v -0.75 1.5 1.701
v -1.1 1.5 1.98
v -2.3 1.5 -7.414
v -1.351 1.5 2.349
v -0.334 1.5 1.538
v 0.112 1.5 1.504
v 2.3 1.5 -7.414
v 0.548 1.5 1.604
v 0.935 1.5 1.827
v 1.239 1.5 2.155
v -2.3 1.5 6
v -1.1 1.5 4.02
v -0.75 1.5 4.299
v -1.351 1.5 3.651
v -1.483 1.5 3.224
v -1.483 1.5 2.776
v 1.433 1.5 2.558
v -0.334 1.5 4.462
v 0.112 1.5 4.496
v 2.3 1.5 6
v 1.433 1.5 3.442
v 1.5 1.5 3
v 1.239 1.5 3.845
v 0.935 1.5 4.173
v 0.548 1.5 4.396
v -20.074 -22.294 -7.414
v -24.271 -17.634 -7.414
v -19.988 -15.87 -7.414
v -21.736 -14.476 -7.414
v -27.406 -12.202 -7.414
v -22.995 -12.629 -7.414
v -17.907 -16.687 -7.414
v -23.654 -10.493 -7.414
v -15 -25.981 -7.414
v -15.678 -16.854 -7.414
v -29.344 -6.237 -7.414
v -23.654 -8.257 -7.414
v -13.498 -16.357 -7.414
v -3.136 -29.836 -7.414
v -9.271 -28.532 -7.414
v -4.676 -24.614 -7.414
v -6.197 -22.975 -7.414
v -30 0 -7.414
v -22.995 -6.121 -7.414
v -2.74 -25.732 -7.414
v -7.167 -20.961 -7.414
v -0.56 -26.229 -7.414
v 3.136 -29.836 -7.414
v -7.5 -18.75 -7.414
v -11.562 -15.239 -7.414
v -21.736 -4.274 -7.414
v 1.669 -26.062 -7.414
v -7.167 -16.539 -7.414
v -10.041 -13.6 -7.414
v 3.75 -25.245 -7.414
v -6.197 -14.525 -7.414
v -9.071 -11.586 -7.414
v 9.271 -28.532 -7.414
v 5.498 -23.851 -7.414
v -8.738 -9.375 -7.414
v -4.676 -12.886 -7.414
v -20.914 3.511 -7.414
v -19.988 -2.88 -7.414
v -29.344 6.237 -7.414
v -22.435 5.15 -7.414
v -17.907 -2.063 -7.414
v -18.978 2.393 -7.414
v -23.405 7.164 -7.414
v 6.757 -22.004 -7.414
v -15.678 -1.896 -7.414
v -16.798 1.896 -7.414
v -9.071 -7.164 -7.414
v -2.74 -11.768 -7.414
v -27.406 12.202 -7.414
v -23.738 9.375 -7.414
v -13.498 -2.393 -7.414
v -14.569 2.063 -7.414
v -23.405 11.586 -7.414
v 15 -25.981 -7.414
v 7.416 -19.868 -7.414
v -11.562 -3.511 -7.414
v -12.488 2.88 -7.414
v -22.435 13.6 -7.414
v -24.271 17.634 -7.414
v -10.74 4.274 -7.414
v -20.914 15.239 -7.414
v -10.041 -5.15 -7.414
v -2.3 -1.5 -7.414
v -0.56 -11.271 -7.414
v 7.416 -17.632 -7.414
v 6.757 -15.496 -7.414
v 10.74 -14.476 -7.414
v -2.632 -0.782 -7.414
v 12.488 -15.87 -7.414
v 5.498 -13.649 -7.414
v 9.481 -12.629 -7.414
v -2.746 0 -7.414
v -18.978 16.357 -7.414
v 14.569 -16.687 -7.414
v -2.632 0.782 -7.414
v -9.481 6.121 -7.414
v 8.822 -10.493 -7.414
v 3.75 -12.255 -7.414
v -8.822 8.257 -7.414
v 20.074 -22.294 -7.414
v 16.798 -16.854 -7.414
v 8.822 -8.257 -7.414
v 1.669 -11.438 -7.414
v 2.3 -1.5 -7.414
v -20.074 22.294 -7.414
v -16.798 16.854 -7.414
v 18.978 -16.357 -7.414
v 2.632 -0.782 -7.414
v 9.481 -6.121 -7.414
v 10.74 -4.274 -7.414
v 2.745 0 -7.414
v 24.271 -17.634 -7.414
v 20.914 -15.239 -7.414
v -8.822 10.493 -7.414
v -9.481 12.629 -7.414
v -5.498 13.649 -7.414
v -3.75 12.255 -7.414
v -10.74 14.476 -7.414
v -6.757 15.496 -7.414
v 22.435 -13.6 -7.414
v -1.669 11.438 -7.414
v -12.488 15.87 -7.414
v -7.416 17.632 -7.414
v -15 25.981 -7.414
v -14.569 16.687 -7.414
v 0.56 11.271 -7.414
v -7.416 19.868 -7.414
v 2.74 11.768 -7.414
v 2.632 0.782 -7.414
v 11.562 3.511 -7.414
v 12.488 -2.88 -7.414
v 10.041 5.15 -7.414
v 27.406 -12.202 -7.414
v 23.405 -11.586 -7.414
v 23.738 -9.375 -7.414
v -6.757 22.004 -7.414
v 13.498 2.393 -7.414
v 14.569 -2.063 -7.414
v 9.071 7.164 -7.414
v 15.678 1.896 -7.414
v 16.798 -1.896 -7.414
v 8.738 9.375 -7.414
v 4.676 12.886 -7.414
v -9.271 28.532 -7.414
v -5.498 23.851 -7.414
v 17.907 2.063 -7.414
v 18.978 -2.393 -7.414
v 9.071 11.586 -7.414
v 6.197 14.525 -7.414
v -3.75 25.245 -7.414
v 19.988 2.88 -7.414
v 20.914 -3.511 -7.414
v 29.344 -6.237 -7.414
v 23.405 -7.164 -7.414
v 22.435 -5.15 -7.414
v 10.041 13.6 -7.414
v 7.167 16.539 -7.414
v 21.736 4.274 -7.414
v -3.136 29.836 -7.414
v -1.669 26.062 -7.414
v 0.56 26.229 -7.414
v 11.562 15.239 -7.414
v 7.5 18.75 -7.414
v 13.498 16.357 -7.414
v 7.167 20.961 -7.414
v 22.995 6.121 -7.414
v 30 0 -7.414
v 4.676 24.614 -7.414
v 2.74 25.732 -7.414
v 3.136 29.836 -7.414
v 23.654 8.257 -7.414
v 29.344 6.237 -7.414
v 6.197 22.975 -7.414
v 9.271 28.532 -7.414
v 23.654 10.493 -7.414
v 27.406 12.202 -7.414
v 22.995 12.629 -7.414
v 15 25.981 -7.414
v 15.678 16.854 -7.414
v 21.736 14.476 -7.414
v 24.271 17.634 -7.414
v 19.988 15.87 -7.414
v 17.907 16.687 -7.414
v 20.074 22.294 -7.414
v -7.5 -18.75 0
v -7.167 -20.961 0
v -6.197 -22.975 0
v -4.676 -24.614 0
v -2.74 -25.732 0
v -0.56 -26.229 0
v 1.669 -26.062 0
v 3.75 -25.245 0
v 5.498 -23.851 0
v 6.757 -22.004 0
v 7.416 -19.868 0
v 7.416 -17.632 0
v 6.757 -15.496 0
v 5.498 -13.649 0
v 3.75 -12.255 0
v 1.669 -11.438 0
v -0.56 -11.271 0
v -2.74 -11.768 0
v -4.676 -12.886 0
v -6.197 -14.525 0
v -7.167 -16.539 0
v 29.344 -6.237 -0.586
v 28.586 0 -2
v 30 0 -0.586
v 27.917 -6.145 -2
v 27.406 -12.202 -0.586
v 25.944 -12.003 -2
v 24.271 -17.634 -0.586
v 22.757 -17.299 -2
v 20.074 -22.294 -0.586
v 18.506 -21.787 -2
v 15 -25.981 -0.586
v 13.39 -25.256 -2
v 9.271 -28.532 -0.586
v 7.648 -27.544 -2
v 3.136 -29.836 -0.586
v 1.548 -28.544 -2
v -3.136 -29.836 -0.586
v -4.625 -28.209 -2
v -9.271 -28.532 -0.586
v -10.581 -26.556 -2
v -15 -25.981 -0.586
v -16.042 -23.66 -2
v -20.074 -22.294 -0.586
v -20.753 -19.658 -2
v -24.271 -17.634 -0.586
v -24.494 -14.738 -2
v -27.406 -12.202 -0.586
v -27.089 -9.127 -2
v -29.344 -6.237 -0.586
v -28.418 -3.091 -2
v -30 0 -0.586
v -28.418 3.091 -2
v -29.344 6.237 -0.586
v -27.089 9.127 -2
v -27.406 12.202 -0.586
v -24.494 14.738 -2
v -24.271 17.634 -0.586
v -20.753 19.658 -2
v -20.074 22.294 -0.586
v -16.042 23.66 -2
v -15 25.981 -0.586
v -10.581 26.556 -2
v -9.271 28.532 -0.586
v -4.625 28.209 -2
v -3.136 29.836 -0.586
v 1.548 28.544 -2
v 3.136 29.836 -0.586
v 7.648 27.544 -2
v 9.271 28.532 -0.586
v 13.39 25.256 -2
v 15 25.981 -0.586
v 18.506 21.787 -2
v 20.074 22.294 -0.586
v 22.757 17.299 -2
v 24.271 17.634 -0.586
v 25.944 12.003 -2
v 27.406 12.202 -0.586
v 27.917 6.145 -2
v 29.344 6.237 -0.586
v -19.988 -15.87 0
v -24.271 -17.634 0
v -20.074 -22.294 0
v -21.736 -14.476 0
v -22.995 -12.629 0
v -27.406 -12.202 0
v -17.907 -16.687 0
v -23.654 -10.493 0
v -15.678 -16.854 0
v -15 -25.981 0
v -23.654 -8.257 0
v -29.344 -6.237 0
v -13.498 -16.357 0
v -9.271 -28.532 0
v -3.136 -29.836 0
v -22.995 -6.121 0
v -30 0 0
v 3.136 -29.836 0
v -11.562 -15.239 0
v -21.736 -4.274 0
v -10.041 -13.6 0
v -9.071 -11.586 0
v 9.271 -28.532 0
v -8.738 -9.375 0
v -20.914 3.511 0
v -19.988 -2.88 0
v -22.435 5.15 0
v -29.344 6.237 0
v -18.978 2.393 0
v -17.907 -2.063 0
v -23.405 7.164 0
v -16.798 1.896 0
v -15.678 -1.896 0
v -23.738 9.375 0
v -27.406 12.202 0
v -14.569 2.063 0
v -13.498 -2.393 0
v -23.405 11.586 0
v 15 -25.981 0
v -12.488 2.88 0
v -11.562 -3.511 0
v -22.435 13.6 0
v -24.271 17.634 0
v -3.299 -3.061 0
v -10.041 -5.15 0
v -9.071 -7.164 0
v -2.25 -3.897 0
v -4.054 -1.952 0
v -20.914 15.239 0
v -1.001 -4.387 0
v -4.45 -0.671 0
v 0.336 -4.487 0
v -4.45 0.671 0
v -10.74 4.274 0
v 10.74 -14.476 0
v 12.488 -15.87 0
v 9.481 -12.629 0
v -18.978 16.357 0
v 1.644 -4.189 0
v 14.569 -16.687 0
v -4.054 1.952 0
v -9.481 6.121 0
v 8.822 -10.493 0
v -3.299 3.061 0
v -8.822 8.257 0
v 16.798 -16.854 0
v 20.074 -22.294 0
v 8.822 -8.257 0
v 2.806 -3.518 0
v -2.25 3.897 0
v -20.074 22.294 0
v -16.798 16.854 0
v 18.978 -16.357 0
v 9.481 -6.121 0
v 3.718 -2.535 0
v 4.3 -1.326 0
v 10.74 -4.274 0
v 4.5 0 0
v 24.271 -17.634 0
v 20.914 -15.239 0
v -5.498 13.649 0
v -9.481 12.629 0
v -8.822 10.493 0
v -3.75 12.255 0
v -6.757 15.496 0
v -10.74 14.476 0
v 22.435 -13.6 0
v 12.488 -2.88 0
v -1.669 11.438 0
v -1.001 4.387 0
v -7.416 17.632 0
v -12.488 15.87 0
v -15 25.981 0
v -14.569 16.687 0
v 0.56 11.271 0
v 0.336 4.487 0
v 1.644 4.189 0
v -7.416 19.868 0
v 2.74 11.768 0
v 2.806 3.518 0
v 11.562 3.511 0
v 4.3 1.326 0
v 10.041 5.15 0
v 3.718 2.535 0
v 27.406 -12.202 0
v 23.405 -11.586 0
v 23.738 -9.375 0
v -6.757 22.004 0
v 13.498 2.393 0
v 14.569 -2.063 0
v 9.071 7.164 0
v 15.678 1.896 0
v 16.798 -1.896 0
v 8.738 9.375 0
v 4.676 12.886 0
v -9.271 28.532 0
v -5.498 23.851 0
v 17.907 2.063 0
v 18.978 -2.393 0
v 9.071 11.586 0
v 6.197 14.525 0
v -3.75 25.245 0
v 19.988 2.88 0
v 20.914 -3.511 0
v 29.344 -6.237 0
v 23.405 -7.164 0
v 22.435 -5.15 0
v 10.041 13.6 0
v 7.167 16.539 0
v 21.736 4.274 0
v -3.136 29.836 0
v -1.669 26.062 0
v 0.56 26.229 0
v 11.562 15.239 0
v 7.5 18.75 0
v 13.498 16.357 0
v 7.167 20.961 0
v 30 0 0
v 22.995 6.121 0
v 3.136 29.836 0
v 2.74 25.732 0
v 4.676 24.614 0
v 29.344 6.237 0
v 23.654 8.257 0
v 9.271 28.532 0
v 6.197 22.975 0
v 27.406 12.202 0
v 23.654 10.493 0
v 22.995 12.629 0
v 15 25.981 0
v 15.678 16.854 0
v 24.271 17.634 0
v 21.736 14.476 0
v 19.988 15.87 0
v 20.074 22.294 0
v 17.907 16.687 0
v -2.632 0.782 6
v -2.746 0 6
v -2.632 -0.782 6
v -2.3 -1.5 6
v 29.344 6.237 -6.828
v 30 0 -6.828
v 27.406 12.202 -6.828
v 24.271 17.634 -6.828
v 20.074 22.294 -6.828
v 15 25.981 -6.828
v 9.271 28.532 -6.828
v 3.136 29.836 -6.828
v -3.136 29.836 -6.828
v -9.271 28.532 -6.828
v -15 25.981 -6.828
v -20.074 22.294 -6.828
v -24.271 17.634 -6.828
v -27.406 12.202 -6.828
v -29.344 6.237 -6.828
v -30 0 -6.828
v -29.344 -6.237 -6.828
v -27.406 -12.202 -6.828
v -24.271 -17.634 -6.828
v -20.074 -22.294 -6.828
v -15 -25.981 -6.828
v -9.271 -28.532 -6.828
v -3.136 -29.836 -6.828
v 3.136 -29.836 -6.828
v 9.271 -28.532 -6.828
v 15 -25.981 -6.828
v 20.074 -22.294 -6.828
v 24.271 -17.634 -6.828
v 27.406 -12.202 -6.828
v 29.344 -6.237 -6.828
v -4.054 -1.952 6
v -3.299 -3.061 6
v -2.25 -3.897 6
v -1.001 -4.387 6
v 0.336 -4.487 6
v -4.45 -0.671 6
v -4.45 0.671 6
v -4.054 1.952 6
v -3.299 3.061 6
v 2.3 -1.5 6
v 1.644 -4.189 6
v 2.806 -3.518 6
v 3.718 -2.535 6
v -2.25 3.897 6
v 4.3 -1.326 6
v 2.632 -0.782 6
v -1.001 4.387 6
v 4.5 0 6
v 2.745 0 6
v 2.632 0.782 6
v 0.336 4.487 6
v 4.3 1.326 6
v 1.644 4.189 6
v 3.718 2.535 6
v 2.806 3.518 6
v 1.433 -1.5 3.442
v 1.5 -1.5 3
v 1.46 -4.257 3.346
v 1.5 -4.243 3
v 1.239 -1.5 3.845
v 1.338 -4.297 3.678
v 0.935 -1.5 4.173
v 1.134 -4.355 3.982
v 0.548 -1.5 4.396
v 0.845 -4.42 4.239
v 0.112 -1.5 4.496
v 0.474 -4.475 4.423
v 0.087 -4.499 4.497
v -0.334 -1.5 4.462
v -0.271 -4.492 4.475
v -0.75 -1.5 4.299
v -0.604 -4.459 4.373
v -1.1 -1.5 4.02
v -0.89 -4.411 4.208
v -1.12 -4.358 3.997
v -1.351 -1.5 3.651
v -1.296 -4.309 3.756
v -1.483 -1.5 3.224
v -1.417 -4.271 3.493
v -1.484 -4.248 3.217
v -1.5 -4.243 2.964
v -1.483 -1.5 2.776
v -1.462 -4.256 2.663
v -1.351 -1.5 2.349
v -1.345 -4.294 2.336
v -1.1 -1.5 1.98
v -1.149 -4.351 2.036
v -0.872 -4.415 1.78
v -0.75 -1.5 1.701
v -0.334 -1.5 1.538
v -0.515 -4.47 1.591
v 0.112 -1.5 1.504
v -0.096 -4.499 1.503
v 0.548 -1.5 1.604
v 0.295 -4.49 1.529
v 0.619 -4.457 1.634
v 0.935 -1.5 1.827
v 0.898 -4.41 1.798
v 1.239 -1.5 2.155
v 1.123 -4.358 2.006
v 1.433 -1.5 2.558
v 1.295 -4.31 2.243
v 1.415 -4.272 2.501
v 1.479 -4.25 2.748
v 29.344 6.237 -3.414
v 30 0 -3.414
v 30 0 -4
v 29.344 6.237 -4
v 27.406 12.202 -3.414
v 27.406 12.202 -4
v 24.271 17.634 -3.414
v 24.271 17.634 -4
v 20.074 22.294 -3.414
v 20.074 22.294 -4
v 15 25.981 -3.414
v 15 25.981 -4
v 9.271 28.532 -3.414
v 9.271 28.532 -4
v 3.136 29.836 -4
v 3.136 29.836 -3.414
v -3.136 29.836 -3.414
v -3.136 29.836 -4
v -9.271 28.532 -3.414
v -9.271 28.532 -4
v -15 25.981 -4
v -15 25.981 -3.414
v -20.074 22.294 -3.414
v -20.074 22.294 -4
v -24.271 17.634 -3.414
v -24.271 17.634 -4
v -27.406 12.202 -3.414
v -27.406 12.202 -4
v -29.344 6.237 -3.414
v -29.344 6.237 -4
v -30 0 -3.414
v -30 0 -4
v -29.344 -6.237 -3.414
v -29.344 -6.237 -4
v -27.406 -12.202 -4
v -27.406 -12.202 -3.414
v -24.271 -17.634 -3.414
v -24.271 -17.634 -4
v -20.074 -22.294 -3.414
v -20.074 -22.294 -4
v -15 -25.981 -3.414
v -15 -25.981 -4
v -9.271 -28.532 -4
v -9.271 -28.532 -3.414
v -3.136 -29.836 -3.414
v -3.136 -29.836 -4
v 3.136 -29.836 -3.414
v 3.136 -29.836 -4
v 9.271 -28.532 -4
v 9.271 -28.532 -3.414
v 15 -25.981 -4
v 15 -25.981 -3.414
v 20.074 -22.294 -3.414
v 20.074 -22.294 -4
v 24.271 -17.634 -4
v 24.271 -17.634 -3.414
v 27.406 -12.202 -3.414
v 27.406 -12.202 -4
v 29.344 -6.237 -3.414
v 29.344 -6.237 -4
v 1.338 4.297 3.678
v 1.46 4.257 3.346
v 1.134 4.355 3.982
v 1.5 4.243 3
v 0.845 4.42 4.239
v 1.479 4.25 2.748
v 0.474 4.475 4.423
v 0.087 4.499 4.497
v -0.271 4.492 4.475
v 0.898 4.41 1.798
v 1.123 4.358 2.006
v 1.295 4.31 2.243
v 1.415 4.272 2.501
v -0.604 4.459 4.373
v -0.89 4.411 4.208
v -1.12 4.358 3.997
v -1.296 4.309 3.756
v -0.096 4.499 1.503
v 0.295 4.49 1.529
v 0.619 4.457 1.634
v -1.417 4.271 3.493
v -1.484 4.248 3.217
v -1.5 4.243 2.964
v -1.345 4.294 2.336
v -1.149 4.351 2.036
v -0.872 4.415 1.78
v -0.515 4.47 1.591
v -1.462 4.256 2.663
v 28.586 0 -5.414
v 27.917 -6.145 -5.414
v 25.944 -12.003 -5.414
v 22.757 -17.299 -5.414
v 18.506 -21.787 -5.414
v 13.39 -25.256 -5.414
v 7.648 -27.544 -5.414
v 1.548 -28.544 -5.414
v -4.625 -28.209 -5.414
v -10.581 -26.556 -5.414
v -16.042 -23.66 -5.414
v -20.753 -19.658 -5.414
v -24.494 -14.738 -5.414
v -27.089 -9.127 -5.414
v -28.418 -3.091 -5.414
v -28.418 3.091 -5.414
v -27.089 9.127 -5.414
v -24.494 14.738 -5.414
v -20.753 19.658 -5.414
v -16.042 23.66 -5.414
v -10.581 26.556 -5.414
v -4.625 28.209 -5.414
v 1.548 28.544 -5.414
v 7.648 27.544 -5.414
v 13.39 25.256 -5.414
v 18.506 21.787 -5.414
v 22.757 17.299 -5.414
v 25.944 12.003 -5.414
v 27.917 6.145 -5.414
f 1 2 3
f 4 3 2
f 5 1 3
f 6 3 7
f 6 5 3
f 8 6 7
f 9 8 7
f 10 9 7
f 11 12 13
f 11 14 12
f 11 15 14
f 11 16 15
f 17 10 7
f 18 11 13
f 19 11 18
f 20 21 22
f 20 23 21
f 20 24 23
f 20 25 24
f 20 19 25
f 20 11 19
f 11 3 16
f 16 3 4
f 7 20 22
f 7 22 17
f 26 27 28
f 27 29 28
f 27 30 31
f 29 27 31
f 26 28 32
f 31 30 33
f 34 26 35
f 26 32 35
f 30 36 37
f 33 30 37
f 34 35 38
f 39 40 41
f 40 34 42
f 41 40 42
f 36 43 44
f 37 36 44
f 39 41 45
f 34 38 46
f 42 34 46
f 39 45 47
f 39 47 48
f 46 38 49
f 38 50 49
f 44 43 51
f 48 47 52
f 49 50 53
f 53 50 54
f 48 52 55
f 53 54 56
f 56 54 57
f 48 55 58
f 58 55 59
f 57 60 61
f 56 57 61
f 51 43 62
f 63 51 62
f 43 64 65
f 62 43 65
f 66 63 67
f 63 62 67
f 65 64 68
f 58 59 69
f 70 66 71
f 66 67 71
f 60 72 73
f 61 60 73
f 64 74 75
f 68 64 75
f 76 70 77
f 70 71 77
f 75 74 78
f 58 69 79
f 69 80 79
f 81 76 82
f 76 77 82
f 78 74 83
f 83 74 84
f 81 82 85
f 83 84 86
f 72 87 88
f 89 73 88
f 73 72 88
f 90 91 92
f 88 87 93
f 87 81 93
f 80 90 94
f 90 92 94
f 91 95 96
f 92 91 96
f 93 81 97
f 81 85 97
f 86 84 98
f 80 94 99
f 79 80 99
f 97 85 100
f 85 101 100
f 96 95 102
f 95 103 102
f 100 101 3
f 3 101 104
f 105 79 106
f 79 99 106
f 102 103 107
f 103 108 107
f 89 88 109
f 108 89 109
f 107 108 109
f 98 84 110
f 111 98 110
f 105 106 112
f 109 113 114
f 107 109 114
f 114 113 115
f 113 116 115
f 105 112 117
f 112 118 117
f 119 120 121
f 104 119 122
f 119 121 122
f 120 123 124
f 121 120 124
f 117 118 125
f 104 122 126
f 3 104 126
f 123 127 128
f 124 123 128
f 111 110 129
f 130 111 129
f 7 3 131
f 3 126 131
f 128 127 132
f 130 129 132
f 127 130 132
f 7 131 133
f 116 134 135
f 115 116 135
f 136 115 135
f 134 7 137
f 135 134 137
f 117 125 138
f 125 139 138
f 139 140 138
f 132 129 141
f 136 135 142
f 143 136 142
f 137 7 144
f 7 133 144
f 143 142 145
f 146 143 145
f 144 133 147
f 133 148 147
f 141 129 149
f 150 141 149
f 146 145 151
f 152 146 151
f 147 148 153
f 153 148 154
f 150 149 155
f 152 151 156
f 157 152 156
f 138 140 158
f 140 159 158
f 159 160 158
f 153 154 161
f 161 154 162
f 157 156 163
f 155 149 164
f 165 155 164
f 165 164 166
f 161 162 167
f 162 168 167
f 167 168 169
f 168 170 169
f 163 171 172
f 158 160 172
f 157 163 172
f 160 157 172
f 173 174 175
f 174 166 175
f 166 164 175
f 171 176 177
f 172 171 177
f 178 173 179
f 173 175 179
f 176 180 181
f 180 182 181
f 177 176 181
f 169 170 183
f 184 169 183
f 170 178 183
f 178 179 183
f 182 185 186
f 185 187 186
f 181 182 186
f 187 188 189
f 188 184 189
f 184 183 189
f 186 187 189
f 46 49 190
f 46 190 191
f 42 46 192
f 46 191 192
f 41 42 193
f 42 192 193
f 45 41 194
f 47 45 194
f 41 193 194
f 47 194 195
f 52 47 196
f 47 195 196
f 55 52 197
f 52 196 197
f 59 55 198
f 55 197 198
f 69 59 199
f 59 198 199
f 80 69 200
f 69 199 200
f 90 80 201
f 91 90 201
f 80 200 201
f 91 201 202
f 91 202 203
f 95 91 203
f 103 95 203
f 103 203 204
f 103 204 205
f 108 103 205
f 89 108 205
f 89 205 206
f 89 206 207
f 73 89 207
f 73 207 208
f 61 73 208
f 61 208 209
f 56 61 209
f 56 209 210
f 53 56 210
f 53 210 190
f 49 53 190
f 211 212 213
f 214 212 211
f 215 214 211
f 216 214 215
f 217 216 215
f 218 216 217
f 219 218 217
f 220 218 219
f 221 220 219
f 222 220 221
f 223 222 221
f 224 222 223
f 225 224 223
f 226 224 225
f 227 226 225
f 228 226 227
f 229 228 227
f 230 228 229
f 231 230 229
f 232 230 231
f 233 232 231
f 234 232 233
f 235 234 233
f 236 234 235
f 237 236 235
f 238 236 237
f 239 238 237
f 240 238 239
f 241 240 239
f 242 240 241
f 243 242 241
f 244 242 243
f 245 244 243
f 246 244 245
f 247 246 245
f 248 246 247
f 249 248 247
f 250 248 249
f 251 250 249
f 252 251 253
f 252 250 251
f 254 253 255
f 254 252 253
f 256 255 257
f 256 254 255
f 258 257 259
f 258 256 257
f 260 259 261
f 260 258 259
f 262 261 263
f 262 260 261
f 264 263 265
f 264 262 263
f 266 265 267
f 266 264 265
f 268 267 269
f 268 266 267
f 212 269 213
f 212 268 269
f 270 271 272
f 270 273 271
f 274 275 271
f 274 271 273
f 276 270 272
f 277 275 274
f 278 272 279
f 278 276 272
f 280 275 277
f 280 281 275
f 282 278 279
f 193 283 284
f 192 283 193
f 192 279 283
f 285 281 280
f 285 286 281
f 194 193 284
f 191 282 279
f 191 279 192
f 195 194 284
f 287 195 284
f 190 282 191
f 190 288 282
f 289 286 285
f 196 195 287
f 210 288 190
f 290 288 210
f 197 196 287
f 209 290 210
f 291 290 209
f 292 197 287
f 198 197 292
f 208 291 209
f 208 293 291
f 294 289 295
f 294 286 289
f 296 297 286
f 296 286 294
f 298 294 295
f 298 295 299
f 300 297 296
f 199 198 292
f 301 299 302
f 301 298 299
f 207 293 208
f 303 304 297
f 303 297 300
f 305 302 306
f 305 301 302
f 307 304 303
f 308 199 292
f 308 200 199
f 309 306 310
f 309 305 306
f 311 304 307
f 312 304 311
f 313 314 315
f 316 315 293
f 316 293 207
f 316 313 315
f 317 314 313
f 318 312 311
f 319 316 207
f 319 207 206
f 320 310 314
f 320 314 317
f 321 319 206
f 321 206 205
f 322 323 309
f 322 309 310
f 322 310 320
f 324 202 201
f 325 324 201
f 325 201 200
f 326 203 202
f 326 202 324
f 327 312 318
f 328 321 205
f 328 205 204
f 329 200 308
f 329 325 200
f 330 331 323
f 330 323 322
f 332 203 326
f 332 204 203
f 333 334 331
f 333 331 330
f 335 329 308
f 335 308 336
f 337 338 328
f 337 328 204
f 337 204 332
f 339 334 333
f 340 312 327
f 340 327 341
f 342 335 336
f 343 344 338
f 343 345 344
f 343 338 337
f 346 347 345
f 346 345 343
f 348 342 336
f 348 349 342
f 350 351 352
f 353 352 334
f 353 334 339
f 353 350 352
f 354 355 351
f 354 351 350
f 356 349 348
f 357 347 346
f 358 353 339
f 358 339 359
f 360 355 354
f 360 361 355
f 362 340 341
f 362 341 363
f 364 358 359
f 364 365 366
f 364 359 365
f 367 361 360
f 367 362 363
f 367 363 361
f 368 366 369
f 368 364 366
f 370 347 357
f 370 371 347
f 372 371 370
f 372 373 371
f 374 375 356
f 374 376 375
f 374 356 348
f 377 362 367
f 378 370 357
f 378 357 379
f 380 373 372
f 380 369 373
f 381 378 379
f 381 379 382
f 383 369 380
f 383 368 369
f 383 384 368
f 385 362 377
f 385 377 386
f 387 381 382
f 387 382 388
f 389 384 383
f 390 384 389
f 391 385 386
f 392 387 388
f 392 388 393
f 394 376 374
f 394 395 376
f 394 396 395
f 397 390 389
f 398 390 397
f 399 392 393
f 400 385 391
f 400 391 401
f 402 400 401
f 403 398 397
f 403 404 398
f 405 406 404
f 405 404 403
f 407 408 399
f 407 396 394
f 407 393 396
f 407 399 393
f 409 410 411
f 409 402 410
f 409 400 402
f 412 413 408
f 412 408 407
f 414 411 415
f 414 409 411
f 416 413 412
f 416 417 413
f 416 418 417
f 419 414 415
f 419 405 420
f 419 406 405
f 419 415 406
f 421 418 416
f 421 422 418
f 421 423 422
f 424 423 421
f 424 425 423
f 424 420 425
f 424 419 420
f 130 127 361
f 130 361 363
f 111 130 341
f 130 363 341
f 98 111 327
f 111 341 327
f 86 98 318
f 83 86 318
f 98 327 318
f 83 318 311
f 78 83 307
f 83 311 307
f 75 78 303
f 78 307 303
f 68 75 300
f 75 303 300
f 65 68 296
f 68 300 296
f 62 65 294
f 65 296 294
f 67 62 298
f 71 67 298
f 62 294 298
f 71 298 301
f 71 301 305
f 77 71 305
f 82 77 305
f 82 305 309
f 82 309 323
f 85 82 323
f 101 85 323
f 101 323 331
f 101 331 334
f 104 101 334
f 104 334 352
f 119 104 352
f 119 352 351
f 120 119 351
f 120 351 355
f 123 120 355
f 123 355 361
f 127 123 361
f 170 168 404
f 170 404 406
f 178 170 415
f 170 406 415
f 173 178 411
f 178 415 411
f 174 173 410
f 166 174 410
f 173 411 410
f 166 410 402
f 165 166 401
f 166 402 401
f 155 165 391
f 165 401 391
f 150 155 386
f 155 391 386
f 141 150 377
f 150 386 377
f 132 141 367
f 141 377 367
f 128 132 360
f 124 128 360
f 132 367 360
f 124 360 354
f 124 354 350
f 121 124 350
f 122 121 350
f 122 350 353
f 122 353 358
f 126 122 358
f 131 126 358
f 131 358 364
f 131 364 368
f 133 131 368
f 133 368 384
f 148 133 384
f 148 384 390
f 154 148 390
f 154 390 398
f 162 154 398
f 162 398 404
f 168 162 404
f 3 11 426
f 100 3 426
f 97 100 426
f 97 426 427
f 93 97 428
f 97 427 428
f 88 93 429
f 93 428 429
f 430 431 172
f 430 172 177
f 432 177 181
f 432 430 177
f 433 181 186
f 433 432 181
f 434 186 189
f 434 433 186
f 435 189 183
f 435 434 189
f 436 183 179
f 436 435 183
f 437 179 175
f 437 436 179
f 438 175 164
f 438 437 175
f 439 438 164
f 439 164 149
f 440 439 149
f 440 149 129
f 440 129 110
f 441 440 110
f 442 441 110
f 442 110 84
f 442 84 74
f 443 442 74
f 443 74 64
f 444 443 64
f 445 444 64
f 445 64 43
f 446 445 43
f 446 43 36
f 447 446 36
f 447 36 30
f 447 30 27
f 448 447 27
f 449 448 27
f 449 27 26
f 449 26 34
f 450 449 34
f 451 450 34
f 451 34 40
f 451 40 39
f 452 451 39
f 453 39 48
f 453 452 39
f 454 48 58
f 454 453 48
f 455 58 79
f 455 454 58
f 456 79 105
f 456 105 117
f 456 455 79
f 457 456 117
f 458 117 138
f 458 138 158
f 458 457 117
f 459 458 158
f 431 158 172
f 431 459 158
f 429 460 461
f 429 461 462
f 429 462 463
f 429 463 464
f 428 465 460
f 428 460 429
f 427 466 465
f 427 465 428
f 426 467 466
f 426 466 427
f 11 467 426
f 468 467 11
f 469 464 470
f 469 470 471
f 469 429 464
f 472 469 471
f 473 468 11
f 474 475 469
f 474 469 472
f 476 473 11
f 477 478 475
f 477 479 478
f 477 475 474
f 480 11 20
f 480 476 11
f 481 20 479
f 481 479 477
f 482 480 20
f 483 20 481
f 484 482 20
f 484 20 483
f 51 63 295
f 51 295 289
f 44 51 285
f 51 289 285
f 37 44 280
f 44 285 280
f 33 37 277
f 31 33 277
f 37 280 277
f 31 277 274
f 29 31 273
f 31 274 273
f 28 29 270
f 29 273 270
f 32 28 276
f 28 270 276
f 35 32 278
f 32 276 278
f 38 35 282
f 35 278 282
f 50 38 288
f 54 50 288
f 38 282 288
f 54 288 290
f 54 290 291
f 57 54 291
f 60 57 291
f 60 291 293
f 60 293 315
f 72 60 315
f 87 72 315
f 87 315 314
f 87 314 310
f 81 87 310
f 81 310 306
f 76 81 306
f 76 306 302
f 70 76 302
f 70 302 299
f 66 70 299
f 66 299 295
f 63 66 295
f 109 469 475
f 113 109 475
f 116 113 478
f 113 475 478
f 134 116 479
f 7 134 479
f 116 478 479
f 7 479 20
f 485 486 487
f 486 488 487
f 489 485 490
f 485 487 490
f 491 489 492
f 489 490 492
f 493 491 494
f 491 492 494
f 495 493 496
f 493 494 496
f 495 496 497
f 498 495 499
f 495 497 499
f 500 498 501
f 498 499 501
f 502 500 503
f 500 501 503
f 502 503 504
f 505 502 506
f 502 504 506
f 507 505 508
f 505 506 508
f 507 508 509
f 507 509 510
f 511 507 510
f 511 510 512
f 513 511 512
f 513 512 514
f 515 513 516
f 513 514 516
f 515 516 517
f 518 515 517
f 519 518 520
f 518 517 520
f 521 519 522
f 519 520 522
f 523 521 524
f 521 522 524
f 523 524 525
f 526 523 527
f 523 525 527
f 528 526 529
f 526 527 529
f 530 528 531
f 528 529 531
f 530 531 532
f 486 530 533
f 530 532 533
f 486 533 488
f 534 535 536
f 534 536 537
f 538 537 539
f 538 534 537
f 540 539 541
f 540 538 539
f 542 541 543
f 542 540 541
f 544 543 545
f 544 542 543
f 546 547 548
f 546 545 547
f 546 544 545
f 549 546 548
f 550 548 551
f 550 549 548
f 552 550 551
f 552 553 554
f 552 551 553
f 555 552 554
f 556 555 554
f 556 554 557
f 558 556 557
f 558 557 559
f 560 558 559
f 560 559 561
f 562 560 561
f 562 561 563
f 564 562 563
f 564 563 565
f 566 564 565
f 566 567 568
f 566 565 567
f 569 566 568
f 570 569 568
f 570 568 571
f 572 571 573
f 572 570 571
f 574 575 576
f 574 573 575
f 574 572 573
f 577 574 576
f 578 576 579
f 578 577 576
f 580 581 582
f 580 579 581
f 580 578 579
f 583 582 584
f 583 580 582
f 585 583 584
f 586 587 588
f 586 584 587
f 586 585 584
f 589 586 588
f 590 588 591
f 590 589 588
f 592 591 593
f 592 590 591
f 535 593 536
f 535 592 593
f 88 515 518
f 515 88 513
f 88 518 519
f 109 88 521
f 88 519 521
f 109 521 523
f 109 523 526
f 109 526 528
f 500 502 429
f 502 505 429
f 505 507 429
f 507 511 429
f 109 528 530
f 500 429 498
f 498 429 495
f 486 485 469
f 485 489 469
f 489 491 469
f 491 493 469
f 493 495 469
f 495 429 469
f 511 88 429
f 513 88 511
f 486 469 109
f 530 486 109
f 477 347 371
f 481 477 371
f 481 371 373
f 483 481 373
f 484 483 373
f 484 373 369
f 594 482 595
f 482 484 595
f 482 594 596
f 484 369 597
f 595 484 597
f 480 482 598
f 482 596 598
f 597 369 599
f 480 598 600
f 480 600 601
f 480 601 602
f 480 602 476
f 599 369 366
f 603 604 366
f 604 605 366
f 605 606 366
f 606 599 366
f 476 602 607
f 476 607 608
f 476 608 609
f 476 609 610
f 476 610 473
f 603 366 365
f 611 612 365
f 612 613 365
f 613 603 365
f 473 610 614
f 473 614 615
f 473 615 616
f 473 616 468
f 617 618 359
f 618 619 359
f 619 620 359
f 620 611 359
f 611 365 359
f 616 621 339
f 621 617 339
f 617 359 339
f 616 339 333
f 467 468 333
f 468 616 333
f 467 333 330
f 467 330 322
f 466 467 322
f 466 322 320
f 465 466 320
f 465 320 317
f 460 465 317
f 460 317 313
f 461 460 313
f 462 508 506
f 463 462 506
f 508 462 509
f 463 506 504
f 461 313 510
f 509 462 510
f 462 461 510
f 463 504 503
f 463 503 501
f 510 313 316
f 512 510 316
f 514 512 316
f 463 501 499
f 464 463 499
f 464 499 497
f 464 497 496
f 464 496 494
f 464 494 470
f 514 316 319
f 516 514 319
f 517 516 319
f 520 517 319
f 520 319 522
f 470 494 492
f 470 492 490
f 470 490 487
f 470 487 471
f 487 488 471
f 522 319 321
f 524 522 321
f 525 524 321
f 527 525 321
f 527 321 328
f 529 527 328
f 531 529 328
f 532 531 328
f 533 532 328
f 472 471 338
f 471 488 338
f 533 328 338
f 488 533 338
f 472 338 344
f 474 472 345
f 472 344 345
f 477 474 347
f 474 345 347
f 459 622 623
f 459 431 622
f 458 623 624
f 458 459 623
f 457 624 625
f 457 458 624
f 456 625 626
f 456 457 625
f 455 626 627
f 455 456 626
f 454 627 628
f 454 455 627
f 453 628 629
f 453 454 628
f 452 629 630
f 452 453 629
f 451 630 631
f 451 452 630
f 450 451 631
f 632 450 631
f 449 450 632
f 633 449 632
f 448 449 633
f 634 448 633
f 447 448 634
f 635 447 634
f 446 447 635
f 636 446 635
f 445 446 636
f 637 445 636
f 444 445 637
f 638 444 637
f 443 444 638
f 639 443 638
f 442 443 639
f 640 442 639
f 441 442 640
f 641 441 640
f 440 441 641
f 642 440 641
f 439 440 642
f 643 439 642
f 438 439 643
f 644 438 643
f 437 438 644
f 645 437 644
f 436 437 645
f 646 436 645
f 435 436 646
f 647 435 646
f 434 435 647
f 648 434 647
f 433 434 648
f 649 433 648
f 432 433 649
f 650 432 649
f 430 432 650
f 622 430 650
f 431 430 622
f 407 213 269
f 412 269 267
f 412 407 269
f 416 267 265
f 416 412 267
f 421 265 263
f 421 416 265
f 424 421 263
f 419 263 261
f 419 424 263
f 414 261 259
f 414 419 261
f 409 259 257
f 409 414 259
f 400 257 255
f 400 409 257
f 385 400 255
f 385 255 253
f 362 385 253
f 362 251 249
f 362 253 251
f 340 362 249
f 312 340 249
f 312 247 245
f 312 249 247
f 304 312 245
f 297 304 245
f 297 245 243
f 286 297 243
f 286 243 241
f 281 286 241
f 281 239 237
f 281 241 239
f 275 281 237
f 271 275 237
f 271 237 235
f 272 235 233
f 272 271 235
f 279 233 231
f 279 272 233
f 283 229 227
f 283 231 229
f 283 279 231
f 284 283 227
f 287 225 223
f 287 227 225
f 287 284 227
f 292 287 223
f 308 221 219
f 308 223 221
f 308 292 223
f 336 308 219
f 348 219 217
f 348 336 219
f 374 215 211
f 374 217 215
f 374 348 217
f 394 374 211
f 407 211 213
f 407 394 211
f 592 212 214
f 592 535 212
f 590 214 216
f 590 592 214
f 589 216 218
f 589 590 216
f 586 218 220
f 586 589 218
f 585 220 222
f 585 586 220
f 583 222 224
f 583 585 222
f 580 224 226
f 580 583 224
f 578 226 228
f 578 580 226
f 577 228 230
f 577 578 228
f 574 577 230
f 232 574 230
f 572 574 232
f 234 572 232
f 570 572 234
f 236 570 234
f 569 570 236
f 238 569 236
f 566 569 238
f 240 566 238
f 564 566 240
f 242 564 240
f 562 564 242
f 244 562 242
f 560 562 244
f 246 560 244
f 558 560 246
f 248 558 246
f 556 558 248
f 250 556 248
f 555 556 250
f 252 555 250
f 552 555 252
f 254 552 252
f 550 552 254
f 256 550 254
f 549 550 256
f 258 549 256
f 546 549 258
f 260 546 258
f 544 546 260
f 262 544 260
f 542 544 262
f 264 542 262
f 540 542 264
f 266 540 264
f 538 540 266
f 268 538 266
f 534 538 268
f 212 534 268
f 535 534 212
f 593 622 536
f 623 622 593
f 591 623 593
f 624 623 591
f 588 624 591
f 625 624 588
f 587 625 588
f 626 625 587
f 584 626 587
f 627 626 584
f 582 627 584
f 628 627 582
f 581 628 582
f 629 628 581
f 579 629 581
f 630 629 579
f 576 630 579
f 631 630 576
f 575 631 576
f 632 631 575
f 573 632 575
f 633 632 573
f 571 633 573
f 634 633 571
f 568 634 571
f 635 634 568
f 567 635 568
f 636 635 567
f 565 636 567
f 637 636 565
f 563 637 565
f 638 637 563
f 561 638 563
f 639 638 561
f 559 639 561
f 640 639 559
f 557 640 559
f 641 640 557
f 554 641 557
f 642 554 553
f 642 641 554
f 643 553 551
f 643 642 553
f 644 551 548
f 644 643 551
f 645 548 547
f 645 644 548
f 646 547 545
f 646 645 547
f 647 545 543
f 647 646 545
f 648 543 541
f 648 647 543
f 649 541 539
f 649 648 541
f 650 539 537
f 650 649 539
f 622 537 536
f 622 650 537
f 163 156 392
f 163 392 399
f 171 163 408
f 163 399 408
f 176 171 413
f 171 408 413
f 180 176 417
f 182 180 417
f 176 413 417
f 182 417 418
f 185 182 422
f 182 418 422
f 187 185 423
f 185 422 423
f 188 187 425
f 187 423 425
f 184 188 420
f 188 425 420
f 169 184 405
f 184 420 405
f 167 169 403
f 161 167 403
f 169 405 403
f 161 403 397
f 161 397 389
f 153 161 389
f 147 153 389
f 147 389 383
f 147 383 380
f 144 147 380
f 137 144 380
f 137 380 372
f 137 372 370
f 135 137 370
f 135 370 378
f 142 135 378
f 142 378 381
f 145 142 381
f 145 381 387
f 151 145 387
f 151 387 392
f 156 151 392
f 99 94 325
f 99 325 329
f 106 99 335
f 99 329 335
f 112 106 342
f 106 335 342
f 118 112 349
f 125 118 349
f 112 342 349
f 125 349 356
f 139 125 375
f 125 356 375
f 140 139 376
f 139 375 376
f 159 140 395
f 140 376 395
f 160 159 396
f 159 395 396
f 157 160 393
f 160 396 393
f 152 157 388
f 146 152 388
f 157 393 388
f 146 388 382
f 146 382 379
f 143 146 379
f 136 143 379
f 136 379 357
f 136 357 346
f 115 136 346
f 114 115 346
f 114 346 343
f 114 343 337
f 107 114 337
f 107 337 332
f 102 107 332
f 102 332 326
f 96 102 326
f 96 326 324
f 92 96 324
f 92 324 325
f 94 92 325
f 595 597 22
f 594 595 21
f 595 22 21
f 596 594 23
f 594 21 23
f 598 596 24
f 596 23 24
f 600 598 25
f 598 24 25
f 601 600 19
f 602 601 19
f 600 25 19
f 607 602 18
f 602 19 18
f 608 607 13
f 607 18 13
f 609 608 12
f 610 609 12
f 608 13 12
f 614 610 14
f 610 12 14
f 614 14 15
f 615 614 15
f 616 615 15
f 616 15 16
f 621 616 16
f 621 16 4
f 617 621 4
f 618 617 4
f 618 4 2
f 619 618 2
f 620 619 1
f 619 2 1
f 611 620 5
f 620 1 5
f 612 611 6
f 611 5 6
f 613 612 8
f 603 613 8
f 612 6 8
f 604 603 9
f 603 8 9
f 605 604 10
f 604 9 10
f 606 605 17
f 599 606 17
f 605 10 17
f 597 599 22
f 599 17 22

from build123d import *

# Parameters (mm, degrees)
F0_R             = 30
F0_R_2           = 4.5
F1_DEPTH         = 7.414
F2_DEPTH         = 6
F3_R             = 1.5
F4_DEPTH         = 12.5
F5_W             = 4.6
F5_H             = 3
F6_DEPTH         = 13.414
F9_R             = 7.5
F10_DEPTH        = 25
F10_COPIES_COUNT = 6


# Not quite as in the source:
# - a pattern or mirror of a feature is missing from the dataset's text; its kind, count and spacing are read off the source's solid


with BuildPart() as f1:
    # F0 (on Top) → F1 (new body)
    with BuildSketch(Plane.XY):
        Circle(F0_R)
        Circle(F0_R_2, mode=Mode.SUBTRACT)
        Circle(F0_R_2)
    extrude(amount=-F1_DEPTH)

    # F0 (on Top) → F2 (join)
    with BuildSketch(Plane.XY):
        Circle(F0_R_2)
    extrude(amount=F2_DEPTH)

    # F3 (on Front) → F4 (cut, symmetric)
    with BuildSketch(Plane.XZ):
        with Locations((0, 3)):
            Circle(F3_R)
    extrude(amount=F4_DEPTH, both=True, mode=Mode.SUBTRACT)

    # F5 (on face) → F6 (cut, through all)
    with BuildSketch(Plane.XY.offset(6)):
        Rectangle(F5_W, F5_H)
        with BuildLine():
            ThreePointArc((-2.3, 1.5), (-2.7459060435, 0), (-2.3, -1.5))
            Line((-2.3, -1.5), (-2.3, 1.5))
        make_face()
        with BuildLine():
            Line((2.3, 1.5), (2.3, -1.5))
            ThreePointArc((2.3, -1.5), (2.745183651, 0), (2.3, 1.5))
        make_face()
    extrude(amount=-F6_DEPTH, mode=Mode.SUBTRACT)

    # F7 (on Front) → F8 (revolve, cut)
    with BuildSketch(Plane.XZ):
        Polygon((30, -3.4142135624), (30, -0.5857864376), (28.5857864376, -2), align=None)
        Polygon((30, -6.8282135624), (30, -3.9997864376), (28.5857864376, -5.414), align=None)
    revolve(axis=Axis((0, 0, 0.7614716887), (0, 0, -1)), mode=Mode.SUBTRACT)

    # F9 (on face) → F10 (cut)
    with BuildSketch(Plane.XY):
        with Locations((0, 18.75)):
            Circle(F9_R)
    f10 = extrude(amount=-F10_DEPTH, mode=Mode.SUBTRACT)

    # F10_copies: F10 ×6 about axis
    f10_copies_axis = Axis((0, 0, 0), (0, 0, 1))
    for i in range(1, F10_COPIES_COUNT):
        add(f10.rotate(f10_copies_axis, i * 360 / F10_COPIES_COUNT), mode=Mode.SUBTRACT)


solid = f1.part
